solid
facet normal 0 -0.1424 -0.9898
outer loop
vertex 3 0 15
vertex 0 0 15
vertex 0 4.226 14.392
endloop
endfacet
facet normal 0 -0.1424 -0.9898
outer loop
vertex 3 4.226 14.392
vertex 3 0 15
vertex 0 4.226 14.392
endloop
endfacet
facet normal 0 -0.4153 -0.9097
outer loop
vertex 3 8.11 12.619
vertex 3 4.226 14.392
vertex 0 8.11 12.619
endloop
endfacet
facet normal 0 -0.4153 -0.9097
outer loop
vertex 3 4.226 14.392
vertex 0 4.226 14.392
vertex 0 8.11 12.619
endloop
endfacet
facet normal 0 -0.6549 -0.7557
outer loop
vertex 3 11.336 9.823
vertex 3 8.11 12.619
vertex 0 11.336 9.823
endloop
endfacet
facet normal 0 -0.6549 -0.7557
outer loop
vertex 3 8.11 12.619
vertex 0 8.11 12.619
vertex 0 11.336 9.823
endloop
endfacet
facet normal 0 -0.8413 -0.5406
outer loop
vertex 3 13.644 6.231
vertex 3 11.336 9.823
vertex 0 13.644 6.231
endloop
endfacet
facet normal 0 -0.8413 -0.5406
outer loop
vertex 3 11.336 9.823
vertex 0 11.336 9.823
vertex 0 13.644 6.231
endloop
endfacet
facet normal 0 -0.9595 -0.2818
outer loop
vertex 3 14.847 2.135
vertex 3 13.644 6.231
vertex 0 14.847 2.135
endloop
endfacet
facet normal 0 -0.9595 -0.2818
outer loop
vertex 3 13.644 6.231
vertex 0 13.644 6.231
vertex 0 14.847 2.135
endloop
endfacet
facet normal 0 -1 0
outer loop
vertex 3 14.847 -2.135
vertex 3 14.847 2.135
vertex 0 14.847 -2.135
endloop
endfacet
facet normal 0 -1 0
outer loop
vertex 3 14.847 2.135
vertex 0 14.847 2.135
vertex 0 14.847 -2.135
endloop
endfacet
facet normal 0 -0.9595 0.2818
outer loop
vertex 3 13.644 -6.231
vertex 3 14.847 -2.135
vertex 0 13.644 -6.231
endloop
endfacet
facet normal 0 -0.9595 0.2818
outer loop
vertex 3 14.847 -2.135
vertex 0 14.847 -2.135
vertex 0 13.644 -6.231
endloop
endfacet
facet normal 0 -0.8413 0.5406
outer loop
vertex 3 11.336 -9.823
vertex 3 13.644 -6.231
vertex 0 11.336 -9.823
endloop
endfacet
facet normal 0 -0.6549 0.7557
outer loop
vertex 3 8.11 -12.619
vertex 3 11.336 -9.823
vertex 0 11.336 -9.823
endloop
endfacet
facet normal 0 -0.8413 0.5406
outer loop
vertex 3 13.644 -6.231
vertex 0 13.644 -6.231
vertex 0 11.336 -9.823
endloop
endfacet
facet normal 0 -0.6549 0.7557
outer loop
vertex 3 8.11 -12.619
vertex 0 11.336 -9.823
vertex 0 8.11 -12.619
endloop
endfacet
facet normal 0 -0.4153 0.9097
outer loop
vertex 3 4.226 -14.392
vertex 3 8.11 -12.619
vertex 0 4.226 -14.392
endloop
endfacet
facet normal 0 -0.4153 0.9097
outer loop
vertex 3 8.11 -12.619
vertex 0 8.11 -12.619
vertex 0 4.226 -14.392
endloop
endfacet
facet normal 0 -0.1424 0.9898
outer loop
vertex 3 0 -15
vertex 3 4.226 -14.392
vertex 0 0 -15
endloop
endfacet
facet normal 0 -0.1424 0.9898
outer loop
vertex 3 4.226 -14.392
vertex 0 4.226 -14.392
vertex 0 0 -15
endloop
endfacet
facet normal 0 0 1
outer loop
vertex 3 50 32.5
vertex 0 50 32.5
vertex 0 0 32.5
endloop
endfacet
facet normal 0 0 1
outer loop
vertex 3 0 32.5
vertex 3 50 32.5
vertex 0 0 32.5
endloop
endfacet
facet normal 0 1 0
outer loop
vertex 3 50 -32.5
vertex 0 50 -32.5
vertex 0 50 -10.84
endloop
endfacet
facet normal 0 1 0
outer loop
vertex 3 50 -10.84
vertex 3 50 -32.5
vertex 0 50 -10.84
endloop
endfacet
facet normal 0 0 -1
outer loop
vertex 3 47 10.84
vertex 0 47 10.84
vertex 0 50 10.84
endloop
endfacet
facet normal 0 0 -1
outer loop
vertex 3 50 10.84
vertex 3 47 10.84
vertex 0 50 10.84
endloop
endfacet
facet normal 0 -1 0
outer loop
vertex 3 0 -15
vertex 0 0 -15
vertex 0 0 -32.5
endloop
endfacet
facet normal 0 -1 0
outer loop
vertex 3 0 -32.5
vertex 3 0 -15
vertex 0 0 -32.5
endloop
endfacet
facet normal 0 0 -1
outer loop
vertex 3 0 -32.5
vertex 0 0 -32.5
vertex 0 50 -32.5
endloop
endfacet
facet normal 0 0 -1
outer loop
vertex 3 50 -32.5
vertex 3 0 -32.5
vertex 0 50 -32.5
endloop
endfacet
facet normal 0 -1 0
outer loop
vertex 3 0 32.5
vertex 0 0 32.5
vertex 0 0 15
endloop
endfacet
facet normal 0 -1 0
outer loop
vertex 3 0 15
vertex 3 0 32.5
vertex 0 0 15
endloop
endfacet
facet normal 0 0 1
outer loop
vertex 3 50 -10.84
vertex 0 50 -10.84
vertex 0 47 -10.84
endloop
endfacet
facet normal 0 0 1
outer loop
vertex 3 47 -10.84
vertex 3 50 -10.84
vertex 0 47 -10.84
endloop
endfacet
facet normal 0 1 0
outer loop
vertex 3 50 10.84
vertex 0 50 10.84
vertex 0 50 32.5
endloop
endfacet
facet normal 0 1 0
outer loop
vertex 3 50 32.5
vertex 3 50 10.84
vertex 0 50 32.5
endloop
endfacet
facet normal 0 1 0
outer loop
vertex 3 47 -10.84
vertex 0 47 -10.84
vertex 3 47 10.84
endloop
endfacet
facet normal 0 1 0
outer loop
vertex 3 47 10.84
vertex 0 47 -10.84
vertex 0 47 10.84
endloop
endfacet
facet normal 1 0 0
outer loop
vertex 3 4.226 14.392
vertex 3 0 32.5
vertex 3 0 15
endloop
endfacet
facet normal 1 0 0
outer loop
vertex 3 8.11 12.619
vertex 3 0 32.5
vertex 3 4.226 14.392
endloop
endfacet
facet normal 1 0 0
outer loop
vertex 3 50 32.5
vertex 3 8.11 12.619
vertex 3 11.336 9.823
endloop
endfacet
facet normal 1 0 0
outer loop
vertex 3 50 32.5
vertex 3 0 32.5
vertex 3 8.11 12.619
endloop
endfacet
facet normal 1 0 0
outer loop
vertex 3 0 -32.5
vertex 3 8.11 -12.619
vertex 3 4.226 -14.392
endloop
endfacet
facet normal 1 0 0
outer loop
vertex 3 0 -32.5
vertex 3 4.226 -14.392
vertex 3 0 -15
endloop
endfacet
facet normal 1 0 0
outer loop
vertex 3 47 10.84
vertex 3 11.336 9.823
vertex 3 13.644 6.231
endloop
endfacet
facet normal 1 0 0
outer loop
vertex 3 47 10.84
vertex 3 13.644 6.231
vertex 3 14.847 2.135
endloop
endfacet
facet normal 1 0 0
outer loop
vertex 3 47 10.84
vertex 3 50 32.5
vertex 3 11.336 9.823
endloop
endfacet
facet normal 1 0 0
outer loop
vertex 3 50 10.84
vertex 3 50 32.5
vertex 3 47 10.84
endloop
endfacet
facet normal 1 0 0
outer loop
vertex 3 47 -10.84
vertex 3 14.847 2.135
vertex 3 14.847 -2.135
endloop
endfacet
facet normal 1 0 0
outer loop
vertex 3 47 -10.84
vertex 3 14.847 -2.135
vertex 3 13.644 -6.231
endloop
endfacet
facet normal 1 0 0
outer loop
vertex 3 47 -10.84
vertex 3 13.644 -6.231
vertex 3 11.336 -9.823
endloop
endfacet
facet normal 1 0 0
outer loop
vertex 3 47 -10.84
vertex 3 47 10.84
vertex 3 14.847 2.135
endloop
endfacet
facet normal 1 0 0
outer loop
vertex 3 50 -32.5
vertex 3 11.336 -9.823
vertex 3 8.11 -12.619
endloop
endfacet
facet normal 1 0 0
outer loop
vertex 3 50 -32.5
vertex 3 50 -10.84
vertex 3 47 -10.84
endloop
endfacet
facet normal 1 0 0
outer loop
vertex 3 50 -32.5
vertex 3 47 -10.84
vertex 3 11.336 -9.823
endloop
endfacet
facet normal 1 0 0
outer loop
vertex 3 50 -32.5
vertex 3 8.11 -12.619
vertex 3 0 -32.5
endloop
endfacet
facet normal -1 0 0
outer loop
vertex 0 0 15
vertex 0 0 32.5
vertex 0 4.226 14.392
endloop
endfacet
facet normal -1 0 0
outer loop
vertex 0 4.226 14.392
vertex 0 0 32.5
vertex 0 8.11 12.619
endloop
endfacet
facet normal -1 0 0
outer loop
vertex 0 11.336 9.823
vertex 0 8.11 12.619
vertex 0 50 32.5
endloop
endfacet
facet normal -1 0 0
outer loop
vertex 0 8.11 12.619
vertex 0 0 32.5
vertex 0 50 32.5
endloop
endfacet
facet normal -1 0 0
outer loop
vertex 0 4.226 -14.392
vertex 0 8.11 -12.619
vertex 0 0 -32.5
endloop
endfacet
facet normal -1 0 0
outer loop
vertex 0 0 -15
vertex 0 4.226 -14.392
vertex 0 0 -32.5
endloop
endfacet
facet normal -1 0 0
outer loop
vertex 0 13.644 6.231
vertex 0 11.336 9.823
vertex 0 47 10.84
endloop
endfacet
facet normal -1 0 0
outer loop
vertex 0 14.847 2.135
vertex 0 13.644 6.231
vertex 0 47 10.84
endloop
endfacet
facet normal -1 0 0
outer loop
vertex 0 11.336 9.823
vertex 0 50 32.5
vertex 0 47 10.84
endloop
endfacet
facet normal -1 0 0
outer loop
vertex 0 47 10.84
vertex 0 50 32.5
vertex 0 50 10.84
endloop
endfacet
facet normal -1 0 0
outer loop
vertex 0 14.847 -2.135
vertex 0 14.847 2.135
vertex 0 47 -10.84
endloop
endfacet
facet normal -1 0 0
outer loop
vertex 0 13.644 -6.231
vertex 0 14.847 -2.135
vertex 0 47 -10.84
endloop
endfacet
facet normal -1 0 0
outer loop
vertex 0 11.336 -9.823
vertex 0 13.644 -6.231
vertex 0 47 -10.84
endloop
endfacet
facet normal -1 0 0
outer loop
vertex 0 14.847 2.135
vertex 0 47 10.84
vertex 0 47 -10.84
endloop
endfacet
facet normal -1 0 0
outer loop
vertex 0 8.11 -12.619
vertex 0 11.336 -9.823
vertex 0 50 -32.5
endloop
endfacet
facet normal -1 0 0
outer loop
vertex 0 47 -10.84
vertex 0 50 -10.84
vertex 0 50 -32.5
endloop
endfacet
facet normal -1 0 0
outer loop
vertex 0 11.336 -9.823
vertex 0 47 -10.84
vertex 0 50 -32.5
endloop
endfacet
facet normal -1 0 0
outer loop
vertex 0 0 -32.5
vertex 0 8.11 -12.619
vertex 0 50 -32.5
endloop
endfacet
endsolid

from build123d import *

# Parameters (mm, degrees)
BOSS_EXTRUDE1_DEPTH = 3


with BuildPart() as part:
    # Sketch1 → Boss-Extrude1 (new body)
    with BuildSketch(Plane(origin=(0, 0, 0), x_dir=(0, 0, -1), z_dir=(1, 0, 0))):
        with BuildLine():
            Line((-32.5, 50), (-32.5, 0))
            Line((-32.5, 0), (-15, 0))
            ThreePointArc((-15, 0), (0, 15), (15, 0))
            Line((15, 0), (32.5, 0))
            Line((32.5, 0), (32.5, 50))
            Line((32.5, 50), (10.84, 50))
            Line((10.84, 50), (10.84, 47))
            Line((10.84, 47), (-10.84, 47))
            Line((-10.84, 47), (-10.84, 50))
            Line((-10.84, 50), (-32.5, 50))
        make_face()
    extrude(amount=BOSS_EXTRUDE1_DEPTH)


solid = part.part
